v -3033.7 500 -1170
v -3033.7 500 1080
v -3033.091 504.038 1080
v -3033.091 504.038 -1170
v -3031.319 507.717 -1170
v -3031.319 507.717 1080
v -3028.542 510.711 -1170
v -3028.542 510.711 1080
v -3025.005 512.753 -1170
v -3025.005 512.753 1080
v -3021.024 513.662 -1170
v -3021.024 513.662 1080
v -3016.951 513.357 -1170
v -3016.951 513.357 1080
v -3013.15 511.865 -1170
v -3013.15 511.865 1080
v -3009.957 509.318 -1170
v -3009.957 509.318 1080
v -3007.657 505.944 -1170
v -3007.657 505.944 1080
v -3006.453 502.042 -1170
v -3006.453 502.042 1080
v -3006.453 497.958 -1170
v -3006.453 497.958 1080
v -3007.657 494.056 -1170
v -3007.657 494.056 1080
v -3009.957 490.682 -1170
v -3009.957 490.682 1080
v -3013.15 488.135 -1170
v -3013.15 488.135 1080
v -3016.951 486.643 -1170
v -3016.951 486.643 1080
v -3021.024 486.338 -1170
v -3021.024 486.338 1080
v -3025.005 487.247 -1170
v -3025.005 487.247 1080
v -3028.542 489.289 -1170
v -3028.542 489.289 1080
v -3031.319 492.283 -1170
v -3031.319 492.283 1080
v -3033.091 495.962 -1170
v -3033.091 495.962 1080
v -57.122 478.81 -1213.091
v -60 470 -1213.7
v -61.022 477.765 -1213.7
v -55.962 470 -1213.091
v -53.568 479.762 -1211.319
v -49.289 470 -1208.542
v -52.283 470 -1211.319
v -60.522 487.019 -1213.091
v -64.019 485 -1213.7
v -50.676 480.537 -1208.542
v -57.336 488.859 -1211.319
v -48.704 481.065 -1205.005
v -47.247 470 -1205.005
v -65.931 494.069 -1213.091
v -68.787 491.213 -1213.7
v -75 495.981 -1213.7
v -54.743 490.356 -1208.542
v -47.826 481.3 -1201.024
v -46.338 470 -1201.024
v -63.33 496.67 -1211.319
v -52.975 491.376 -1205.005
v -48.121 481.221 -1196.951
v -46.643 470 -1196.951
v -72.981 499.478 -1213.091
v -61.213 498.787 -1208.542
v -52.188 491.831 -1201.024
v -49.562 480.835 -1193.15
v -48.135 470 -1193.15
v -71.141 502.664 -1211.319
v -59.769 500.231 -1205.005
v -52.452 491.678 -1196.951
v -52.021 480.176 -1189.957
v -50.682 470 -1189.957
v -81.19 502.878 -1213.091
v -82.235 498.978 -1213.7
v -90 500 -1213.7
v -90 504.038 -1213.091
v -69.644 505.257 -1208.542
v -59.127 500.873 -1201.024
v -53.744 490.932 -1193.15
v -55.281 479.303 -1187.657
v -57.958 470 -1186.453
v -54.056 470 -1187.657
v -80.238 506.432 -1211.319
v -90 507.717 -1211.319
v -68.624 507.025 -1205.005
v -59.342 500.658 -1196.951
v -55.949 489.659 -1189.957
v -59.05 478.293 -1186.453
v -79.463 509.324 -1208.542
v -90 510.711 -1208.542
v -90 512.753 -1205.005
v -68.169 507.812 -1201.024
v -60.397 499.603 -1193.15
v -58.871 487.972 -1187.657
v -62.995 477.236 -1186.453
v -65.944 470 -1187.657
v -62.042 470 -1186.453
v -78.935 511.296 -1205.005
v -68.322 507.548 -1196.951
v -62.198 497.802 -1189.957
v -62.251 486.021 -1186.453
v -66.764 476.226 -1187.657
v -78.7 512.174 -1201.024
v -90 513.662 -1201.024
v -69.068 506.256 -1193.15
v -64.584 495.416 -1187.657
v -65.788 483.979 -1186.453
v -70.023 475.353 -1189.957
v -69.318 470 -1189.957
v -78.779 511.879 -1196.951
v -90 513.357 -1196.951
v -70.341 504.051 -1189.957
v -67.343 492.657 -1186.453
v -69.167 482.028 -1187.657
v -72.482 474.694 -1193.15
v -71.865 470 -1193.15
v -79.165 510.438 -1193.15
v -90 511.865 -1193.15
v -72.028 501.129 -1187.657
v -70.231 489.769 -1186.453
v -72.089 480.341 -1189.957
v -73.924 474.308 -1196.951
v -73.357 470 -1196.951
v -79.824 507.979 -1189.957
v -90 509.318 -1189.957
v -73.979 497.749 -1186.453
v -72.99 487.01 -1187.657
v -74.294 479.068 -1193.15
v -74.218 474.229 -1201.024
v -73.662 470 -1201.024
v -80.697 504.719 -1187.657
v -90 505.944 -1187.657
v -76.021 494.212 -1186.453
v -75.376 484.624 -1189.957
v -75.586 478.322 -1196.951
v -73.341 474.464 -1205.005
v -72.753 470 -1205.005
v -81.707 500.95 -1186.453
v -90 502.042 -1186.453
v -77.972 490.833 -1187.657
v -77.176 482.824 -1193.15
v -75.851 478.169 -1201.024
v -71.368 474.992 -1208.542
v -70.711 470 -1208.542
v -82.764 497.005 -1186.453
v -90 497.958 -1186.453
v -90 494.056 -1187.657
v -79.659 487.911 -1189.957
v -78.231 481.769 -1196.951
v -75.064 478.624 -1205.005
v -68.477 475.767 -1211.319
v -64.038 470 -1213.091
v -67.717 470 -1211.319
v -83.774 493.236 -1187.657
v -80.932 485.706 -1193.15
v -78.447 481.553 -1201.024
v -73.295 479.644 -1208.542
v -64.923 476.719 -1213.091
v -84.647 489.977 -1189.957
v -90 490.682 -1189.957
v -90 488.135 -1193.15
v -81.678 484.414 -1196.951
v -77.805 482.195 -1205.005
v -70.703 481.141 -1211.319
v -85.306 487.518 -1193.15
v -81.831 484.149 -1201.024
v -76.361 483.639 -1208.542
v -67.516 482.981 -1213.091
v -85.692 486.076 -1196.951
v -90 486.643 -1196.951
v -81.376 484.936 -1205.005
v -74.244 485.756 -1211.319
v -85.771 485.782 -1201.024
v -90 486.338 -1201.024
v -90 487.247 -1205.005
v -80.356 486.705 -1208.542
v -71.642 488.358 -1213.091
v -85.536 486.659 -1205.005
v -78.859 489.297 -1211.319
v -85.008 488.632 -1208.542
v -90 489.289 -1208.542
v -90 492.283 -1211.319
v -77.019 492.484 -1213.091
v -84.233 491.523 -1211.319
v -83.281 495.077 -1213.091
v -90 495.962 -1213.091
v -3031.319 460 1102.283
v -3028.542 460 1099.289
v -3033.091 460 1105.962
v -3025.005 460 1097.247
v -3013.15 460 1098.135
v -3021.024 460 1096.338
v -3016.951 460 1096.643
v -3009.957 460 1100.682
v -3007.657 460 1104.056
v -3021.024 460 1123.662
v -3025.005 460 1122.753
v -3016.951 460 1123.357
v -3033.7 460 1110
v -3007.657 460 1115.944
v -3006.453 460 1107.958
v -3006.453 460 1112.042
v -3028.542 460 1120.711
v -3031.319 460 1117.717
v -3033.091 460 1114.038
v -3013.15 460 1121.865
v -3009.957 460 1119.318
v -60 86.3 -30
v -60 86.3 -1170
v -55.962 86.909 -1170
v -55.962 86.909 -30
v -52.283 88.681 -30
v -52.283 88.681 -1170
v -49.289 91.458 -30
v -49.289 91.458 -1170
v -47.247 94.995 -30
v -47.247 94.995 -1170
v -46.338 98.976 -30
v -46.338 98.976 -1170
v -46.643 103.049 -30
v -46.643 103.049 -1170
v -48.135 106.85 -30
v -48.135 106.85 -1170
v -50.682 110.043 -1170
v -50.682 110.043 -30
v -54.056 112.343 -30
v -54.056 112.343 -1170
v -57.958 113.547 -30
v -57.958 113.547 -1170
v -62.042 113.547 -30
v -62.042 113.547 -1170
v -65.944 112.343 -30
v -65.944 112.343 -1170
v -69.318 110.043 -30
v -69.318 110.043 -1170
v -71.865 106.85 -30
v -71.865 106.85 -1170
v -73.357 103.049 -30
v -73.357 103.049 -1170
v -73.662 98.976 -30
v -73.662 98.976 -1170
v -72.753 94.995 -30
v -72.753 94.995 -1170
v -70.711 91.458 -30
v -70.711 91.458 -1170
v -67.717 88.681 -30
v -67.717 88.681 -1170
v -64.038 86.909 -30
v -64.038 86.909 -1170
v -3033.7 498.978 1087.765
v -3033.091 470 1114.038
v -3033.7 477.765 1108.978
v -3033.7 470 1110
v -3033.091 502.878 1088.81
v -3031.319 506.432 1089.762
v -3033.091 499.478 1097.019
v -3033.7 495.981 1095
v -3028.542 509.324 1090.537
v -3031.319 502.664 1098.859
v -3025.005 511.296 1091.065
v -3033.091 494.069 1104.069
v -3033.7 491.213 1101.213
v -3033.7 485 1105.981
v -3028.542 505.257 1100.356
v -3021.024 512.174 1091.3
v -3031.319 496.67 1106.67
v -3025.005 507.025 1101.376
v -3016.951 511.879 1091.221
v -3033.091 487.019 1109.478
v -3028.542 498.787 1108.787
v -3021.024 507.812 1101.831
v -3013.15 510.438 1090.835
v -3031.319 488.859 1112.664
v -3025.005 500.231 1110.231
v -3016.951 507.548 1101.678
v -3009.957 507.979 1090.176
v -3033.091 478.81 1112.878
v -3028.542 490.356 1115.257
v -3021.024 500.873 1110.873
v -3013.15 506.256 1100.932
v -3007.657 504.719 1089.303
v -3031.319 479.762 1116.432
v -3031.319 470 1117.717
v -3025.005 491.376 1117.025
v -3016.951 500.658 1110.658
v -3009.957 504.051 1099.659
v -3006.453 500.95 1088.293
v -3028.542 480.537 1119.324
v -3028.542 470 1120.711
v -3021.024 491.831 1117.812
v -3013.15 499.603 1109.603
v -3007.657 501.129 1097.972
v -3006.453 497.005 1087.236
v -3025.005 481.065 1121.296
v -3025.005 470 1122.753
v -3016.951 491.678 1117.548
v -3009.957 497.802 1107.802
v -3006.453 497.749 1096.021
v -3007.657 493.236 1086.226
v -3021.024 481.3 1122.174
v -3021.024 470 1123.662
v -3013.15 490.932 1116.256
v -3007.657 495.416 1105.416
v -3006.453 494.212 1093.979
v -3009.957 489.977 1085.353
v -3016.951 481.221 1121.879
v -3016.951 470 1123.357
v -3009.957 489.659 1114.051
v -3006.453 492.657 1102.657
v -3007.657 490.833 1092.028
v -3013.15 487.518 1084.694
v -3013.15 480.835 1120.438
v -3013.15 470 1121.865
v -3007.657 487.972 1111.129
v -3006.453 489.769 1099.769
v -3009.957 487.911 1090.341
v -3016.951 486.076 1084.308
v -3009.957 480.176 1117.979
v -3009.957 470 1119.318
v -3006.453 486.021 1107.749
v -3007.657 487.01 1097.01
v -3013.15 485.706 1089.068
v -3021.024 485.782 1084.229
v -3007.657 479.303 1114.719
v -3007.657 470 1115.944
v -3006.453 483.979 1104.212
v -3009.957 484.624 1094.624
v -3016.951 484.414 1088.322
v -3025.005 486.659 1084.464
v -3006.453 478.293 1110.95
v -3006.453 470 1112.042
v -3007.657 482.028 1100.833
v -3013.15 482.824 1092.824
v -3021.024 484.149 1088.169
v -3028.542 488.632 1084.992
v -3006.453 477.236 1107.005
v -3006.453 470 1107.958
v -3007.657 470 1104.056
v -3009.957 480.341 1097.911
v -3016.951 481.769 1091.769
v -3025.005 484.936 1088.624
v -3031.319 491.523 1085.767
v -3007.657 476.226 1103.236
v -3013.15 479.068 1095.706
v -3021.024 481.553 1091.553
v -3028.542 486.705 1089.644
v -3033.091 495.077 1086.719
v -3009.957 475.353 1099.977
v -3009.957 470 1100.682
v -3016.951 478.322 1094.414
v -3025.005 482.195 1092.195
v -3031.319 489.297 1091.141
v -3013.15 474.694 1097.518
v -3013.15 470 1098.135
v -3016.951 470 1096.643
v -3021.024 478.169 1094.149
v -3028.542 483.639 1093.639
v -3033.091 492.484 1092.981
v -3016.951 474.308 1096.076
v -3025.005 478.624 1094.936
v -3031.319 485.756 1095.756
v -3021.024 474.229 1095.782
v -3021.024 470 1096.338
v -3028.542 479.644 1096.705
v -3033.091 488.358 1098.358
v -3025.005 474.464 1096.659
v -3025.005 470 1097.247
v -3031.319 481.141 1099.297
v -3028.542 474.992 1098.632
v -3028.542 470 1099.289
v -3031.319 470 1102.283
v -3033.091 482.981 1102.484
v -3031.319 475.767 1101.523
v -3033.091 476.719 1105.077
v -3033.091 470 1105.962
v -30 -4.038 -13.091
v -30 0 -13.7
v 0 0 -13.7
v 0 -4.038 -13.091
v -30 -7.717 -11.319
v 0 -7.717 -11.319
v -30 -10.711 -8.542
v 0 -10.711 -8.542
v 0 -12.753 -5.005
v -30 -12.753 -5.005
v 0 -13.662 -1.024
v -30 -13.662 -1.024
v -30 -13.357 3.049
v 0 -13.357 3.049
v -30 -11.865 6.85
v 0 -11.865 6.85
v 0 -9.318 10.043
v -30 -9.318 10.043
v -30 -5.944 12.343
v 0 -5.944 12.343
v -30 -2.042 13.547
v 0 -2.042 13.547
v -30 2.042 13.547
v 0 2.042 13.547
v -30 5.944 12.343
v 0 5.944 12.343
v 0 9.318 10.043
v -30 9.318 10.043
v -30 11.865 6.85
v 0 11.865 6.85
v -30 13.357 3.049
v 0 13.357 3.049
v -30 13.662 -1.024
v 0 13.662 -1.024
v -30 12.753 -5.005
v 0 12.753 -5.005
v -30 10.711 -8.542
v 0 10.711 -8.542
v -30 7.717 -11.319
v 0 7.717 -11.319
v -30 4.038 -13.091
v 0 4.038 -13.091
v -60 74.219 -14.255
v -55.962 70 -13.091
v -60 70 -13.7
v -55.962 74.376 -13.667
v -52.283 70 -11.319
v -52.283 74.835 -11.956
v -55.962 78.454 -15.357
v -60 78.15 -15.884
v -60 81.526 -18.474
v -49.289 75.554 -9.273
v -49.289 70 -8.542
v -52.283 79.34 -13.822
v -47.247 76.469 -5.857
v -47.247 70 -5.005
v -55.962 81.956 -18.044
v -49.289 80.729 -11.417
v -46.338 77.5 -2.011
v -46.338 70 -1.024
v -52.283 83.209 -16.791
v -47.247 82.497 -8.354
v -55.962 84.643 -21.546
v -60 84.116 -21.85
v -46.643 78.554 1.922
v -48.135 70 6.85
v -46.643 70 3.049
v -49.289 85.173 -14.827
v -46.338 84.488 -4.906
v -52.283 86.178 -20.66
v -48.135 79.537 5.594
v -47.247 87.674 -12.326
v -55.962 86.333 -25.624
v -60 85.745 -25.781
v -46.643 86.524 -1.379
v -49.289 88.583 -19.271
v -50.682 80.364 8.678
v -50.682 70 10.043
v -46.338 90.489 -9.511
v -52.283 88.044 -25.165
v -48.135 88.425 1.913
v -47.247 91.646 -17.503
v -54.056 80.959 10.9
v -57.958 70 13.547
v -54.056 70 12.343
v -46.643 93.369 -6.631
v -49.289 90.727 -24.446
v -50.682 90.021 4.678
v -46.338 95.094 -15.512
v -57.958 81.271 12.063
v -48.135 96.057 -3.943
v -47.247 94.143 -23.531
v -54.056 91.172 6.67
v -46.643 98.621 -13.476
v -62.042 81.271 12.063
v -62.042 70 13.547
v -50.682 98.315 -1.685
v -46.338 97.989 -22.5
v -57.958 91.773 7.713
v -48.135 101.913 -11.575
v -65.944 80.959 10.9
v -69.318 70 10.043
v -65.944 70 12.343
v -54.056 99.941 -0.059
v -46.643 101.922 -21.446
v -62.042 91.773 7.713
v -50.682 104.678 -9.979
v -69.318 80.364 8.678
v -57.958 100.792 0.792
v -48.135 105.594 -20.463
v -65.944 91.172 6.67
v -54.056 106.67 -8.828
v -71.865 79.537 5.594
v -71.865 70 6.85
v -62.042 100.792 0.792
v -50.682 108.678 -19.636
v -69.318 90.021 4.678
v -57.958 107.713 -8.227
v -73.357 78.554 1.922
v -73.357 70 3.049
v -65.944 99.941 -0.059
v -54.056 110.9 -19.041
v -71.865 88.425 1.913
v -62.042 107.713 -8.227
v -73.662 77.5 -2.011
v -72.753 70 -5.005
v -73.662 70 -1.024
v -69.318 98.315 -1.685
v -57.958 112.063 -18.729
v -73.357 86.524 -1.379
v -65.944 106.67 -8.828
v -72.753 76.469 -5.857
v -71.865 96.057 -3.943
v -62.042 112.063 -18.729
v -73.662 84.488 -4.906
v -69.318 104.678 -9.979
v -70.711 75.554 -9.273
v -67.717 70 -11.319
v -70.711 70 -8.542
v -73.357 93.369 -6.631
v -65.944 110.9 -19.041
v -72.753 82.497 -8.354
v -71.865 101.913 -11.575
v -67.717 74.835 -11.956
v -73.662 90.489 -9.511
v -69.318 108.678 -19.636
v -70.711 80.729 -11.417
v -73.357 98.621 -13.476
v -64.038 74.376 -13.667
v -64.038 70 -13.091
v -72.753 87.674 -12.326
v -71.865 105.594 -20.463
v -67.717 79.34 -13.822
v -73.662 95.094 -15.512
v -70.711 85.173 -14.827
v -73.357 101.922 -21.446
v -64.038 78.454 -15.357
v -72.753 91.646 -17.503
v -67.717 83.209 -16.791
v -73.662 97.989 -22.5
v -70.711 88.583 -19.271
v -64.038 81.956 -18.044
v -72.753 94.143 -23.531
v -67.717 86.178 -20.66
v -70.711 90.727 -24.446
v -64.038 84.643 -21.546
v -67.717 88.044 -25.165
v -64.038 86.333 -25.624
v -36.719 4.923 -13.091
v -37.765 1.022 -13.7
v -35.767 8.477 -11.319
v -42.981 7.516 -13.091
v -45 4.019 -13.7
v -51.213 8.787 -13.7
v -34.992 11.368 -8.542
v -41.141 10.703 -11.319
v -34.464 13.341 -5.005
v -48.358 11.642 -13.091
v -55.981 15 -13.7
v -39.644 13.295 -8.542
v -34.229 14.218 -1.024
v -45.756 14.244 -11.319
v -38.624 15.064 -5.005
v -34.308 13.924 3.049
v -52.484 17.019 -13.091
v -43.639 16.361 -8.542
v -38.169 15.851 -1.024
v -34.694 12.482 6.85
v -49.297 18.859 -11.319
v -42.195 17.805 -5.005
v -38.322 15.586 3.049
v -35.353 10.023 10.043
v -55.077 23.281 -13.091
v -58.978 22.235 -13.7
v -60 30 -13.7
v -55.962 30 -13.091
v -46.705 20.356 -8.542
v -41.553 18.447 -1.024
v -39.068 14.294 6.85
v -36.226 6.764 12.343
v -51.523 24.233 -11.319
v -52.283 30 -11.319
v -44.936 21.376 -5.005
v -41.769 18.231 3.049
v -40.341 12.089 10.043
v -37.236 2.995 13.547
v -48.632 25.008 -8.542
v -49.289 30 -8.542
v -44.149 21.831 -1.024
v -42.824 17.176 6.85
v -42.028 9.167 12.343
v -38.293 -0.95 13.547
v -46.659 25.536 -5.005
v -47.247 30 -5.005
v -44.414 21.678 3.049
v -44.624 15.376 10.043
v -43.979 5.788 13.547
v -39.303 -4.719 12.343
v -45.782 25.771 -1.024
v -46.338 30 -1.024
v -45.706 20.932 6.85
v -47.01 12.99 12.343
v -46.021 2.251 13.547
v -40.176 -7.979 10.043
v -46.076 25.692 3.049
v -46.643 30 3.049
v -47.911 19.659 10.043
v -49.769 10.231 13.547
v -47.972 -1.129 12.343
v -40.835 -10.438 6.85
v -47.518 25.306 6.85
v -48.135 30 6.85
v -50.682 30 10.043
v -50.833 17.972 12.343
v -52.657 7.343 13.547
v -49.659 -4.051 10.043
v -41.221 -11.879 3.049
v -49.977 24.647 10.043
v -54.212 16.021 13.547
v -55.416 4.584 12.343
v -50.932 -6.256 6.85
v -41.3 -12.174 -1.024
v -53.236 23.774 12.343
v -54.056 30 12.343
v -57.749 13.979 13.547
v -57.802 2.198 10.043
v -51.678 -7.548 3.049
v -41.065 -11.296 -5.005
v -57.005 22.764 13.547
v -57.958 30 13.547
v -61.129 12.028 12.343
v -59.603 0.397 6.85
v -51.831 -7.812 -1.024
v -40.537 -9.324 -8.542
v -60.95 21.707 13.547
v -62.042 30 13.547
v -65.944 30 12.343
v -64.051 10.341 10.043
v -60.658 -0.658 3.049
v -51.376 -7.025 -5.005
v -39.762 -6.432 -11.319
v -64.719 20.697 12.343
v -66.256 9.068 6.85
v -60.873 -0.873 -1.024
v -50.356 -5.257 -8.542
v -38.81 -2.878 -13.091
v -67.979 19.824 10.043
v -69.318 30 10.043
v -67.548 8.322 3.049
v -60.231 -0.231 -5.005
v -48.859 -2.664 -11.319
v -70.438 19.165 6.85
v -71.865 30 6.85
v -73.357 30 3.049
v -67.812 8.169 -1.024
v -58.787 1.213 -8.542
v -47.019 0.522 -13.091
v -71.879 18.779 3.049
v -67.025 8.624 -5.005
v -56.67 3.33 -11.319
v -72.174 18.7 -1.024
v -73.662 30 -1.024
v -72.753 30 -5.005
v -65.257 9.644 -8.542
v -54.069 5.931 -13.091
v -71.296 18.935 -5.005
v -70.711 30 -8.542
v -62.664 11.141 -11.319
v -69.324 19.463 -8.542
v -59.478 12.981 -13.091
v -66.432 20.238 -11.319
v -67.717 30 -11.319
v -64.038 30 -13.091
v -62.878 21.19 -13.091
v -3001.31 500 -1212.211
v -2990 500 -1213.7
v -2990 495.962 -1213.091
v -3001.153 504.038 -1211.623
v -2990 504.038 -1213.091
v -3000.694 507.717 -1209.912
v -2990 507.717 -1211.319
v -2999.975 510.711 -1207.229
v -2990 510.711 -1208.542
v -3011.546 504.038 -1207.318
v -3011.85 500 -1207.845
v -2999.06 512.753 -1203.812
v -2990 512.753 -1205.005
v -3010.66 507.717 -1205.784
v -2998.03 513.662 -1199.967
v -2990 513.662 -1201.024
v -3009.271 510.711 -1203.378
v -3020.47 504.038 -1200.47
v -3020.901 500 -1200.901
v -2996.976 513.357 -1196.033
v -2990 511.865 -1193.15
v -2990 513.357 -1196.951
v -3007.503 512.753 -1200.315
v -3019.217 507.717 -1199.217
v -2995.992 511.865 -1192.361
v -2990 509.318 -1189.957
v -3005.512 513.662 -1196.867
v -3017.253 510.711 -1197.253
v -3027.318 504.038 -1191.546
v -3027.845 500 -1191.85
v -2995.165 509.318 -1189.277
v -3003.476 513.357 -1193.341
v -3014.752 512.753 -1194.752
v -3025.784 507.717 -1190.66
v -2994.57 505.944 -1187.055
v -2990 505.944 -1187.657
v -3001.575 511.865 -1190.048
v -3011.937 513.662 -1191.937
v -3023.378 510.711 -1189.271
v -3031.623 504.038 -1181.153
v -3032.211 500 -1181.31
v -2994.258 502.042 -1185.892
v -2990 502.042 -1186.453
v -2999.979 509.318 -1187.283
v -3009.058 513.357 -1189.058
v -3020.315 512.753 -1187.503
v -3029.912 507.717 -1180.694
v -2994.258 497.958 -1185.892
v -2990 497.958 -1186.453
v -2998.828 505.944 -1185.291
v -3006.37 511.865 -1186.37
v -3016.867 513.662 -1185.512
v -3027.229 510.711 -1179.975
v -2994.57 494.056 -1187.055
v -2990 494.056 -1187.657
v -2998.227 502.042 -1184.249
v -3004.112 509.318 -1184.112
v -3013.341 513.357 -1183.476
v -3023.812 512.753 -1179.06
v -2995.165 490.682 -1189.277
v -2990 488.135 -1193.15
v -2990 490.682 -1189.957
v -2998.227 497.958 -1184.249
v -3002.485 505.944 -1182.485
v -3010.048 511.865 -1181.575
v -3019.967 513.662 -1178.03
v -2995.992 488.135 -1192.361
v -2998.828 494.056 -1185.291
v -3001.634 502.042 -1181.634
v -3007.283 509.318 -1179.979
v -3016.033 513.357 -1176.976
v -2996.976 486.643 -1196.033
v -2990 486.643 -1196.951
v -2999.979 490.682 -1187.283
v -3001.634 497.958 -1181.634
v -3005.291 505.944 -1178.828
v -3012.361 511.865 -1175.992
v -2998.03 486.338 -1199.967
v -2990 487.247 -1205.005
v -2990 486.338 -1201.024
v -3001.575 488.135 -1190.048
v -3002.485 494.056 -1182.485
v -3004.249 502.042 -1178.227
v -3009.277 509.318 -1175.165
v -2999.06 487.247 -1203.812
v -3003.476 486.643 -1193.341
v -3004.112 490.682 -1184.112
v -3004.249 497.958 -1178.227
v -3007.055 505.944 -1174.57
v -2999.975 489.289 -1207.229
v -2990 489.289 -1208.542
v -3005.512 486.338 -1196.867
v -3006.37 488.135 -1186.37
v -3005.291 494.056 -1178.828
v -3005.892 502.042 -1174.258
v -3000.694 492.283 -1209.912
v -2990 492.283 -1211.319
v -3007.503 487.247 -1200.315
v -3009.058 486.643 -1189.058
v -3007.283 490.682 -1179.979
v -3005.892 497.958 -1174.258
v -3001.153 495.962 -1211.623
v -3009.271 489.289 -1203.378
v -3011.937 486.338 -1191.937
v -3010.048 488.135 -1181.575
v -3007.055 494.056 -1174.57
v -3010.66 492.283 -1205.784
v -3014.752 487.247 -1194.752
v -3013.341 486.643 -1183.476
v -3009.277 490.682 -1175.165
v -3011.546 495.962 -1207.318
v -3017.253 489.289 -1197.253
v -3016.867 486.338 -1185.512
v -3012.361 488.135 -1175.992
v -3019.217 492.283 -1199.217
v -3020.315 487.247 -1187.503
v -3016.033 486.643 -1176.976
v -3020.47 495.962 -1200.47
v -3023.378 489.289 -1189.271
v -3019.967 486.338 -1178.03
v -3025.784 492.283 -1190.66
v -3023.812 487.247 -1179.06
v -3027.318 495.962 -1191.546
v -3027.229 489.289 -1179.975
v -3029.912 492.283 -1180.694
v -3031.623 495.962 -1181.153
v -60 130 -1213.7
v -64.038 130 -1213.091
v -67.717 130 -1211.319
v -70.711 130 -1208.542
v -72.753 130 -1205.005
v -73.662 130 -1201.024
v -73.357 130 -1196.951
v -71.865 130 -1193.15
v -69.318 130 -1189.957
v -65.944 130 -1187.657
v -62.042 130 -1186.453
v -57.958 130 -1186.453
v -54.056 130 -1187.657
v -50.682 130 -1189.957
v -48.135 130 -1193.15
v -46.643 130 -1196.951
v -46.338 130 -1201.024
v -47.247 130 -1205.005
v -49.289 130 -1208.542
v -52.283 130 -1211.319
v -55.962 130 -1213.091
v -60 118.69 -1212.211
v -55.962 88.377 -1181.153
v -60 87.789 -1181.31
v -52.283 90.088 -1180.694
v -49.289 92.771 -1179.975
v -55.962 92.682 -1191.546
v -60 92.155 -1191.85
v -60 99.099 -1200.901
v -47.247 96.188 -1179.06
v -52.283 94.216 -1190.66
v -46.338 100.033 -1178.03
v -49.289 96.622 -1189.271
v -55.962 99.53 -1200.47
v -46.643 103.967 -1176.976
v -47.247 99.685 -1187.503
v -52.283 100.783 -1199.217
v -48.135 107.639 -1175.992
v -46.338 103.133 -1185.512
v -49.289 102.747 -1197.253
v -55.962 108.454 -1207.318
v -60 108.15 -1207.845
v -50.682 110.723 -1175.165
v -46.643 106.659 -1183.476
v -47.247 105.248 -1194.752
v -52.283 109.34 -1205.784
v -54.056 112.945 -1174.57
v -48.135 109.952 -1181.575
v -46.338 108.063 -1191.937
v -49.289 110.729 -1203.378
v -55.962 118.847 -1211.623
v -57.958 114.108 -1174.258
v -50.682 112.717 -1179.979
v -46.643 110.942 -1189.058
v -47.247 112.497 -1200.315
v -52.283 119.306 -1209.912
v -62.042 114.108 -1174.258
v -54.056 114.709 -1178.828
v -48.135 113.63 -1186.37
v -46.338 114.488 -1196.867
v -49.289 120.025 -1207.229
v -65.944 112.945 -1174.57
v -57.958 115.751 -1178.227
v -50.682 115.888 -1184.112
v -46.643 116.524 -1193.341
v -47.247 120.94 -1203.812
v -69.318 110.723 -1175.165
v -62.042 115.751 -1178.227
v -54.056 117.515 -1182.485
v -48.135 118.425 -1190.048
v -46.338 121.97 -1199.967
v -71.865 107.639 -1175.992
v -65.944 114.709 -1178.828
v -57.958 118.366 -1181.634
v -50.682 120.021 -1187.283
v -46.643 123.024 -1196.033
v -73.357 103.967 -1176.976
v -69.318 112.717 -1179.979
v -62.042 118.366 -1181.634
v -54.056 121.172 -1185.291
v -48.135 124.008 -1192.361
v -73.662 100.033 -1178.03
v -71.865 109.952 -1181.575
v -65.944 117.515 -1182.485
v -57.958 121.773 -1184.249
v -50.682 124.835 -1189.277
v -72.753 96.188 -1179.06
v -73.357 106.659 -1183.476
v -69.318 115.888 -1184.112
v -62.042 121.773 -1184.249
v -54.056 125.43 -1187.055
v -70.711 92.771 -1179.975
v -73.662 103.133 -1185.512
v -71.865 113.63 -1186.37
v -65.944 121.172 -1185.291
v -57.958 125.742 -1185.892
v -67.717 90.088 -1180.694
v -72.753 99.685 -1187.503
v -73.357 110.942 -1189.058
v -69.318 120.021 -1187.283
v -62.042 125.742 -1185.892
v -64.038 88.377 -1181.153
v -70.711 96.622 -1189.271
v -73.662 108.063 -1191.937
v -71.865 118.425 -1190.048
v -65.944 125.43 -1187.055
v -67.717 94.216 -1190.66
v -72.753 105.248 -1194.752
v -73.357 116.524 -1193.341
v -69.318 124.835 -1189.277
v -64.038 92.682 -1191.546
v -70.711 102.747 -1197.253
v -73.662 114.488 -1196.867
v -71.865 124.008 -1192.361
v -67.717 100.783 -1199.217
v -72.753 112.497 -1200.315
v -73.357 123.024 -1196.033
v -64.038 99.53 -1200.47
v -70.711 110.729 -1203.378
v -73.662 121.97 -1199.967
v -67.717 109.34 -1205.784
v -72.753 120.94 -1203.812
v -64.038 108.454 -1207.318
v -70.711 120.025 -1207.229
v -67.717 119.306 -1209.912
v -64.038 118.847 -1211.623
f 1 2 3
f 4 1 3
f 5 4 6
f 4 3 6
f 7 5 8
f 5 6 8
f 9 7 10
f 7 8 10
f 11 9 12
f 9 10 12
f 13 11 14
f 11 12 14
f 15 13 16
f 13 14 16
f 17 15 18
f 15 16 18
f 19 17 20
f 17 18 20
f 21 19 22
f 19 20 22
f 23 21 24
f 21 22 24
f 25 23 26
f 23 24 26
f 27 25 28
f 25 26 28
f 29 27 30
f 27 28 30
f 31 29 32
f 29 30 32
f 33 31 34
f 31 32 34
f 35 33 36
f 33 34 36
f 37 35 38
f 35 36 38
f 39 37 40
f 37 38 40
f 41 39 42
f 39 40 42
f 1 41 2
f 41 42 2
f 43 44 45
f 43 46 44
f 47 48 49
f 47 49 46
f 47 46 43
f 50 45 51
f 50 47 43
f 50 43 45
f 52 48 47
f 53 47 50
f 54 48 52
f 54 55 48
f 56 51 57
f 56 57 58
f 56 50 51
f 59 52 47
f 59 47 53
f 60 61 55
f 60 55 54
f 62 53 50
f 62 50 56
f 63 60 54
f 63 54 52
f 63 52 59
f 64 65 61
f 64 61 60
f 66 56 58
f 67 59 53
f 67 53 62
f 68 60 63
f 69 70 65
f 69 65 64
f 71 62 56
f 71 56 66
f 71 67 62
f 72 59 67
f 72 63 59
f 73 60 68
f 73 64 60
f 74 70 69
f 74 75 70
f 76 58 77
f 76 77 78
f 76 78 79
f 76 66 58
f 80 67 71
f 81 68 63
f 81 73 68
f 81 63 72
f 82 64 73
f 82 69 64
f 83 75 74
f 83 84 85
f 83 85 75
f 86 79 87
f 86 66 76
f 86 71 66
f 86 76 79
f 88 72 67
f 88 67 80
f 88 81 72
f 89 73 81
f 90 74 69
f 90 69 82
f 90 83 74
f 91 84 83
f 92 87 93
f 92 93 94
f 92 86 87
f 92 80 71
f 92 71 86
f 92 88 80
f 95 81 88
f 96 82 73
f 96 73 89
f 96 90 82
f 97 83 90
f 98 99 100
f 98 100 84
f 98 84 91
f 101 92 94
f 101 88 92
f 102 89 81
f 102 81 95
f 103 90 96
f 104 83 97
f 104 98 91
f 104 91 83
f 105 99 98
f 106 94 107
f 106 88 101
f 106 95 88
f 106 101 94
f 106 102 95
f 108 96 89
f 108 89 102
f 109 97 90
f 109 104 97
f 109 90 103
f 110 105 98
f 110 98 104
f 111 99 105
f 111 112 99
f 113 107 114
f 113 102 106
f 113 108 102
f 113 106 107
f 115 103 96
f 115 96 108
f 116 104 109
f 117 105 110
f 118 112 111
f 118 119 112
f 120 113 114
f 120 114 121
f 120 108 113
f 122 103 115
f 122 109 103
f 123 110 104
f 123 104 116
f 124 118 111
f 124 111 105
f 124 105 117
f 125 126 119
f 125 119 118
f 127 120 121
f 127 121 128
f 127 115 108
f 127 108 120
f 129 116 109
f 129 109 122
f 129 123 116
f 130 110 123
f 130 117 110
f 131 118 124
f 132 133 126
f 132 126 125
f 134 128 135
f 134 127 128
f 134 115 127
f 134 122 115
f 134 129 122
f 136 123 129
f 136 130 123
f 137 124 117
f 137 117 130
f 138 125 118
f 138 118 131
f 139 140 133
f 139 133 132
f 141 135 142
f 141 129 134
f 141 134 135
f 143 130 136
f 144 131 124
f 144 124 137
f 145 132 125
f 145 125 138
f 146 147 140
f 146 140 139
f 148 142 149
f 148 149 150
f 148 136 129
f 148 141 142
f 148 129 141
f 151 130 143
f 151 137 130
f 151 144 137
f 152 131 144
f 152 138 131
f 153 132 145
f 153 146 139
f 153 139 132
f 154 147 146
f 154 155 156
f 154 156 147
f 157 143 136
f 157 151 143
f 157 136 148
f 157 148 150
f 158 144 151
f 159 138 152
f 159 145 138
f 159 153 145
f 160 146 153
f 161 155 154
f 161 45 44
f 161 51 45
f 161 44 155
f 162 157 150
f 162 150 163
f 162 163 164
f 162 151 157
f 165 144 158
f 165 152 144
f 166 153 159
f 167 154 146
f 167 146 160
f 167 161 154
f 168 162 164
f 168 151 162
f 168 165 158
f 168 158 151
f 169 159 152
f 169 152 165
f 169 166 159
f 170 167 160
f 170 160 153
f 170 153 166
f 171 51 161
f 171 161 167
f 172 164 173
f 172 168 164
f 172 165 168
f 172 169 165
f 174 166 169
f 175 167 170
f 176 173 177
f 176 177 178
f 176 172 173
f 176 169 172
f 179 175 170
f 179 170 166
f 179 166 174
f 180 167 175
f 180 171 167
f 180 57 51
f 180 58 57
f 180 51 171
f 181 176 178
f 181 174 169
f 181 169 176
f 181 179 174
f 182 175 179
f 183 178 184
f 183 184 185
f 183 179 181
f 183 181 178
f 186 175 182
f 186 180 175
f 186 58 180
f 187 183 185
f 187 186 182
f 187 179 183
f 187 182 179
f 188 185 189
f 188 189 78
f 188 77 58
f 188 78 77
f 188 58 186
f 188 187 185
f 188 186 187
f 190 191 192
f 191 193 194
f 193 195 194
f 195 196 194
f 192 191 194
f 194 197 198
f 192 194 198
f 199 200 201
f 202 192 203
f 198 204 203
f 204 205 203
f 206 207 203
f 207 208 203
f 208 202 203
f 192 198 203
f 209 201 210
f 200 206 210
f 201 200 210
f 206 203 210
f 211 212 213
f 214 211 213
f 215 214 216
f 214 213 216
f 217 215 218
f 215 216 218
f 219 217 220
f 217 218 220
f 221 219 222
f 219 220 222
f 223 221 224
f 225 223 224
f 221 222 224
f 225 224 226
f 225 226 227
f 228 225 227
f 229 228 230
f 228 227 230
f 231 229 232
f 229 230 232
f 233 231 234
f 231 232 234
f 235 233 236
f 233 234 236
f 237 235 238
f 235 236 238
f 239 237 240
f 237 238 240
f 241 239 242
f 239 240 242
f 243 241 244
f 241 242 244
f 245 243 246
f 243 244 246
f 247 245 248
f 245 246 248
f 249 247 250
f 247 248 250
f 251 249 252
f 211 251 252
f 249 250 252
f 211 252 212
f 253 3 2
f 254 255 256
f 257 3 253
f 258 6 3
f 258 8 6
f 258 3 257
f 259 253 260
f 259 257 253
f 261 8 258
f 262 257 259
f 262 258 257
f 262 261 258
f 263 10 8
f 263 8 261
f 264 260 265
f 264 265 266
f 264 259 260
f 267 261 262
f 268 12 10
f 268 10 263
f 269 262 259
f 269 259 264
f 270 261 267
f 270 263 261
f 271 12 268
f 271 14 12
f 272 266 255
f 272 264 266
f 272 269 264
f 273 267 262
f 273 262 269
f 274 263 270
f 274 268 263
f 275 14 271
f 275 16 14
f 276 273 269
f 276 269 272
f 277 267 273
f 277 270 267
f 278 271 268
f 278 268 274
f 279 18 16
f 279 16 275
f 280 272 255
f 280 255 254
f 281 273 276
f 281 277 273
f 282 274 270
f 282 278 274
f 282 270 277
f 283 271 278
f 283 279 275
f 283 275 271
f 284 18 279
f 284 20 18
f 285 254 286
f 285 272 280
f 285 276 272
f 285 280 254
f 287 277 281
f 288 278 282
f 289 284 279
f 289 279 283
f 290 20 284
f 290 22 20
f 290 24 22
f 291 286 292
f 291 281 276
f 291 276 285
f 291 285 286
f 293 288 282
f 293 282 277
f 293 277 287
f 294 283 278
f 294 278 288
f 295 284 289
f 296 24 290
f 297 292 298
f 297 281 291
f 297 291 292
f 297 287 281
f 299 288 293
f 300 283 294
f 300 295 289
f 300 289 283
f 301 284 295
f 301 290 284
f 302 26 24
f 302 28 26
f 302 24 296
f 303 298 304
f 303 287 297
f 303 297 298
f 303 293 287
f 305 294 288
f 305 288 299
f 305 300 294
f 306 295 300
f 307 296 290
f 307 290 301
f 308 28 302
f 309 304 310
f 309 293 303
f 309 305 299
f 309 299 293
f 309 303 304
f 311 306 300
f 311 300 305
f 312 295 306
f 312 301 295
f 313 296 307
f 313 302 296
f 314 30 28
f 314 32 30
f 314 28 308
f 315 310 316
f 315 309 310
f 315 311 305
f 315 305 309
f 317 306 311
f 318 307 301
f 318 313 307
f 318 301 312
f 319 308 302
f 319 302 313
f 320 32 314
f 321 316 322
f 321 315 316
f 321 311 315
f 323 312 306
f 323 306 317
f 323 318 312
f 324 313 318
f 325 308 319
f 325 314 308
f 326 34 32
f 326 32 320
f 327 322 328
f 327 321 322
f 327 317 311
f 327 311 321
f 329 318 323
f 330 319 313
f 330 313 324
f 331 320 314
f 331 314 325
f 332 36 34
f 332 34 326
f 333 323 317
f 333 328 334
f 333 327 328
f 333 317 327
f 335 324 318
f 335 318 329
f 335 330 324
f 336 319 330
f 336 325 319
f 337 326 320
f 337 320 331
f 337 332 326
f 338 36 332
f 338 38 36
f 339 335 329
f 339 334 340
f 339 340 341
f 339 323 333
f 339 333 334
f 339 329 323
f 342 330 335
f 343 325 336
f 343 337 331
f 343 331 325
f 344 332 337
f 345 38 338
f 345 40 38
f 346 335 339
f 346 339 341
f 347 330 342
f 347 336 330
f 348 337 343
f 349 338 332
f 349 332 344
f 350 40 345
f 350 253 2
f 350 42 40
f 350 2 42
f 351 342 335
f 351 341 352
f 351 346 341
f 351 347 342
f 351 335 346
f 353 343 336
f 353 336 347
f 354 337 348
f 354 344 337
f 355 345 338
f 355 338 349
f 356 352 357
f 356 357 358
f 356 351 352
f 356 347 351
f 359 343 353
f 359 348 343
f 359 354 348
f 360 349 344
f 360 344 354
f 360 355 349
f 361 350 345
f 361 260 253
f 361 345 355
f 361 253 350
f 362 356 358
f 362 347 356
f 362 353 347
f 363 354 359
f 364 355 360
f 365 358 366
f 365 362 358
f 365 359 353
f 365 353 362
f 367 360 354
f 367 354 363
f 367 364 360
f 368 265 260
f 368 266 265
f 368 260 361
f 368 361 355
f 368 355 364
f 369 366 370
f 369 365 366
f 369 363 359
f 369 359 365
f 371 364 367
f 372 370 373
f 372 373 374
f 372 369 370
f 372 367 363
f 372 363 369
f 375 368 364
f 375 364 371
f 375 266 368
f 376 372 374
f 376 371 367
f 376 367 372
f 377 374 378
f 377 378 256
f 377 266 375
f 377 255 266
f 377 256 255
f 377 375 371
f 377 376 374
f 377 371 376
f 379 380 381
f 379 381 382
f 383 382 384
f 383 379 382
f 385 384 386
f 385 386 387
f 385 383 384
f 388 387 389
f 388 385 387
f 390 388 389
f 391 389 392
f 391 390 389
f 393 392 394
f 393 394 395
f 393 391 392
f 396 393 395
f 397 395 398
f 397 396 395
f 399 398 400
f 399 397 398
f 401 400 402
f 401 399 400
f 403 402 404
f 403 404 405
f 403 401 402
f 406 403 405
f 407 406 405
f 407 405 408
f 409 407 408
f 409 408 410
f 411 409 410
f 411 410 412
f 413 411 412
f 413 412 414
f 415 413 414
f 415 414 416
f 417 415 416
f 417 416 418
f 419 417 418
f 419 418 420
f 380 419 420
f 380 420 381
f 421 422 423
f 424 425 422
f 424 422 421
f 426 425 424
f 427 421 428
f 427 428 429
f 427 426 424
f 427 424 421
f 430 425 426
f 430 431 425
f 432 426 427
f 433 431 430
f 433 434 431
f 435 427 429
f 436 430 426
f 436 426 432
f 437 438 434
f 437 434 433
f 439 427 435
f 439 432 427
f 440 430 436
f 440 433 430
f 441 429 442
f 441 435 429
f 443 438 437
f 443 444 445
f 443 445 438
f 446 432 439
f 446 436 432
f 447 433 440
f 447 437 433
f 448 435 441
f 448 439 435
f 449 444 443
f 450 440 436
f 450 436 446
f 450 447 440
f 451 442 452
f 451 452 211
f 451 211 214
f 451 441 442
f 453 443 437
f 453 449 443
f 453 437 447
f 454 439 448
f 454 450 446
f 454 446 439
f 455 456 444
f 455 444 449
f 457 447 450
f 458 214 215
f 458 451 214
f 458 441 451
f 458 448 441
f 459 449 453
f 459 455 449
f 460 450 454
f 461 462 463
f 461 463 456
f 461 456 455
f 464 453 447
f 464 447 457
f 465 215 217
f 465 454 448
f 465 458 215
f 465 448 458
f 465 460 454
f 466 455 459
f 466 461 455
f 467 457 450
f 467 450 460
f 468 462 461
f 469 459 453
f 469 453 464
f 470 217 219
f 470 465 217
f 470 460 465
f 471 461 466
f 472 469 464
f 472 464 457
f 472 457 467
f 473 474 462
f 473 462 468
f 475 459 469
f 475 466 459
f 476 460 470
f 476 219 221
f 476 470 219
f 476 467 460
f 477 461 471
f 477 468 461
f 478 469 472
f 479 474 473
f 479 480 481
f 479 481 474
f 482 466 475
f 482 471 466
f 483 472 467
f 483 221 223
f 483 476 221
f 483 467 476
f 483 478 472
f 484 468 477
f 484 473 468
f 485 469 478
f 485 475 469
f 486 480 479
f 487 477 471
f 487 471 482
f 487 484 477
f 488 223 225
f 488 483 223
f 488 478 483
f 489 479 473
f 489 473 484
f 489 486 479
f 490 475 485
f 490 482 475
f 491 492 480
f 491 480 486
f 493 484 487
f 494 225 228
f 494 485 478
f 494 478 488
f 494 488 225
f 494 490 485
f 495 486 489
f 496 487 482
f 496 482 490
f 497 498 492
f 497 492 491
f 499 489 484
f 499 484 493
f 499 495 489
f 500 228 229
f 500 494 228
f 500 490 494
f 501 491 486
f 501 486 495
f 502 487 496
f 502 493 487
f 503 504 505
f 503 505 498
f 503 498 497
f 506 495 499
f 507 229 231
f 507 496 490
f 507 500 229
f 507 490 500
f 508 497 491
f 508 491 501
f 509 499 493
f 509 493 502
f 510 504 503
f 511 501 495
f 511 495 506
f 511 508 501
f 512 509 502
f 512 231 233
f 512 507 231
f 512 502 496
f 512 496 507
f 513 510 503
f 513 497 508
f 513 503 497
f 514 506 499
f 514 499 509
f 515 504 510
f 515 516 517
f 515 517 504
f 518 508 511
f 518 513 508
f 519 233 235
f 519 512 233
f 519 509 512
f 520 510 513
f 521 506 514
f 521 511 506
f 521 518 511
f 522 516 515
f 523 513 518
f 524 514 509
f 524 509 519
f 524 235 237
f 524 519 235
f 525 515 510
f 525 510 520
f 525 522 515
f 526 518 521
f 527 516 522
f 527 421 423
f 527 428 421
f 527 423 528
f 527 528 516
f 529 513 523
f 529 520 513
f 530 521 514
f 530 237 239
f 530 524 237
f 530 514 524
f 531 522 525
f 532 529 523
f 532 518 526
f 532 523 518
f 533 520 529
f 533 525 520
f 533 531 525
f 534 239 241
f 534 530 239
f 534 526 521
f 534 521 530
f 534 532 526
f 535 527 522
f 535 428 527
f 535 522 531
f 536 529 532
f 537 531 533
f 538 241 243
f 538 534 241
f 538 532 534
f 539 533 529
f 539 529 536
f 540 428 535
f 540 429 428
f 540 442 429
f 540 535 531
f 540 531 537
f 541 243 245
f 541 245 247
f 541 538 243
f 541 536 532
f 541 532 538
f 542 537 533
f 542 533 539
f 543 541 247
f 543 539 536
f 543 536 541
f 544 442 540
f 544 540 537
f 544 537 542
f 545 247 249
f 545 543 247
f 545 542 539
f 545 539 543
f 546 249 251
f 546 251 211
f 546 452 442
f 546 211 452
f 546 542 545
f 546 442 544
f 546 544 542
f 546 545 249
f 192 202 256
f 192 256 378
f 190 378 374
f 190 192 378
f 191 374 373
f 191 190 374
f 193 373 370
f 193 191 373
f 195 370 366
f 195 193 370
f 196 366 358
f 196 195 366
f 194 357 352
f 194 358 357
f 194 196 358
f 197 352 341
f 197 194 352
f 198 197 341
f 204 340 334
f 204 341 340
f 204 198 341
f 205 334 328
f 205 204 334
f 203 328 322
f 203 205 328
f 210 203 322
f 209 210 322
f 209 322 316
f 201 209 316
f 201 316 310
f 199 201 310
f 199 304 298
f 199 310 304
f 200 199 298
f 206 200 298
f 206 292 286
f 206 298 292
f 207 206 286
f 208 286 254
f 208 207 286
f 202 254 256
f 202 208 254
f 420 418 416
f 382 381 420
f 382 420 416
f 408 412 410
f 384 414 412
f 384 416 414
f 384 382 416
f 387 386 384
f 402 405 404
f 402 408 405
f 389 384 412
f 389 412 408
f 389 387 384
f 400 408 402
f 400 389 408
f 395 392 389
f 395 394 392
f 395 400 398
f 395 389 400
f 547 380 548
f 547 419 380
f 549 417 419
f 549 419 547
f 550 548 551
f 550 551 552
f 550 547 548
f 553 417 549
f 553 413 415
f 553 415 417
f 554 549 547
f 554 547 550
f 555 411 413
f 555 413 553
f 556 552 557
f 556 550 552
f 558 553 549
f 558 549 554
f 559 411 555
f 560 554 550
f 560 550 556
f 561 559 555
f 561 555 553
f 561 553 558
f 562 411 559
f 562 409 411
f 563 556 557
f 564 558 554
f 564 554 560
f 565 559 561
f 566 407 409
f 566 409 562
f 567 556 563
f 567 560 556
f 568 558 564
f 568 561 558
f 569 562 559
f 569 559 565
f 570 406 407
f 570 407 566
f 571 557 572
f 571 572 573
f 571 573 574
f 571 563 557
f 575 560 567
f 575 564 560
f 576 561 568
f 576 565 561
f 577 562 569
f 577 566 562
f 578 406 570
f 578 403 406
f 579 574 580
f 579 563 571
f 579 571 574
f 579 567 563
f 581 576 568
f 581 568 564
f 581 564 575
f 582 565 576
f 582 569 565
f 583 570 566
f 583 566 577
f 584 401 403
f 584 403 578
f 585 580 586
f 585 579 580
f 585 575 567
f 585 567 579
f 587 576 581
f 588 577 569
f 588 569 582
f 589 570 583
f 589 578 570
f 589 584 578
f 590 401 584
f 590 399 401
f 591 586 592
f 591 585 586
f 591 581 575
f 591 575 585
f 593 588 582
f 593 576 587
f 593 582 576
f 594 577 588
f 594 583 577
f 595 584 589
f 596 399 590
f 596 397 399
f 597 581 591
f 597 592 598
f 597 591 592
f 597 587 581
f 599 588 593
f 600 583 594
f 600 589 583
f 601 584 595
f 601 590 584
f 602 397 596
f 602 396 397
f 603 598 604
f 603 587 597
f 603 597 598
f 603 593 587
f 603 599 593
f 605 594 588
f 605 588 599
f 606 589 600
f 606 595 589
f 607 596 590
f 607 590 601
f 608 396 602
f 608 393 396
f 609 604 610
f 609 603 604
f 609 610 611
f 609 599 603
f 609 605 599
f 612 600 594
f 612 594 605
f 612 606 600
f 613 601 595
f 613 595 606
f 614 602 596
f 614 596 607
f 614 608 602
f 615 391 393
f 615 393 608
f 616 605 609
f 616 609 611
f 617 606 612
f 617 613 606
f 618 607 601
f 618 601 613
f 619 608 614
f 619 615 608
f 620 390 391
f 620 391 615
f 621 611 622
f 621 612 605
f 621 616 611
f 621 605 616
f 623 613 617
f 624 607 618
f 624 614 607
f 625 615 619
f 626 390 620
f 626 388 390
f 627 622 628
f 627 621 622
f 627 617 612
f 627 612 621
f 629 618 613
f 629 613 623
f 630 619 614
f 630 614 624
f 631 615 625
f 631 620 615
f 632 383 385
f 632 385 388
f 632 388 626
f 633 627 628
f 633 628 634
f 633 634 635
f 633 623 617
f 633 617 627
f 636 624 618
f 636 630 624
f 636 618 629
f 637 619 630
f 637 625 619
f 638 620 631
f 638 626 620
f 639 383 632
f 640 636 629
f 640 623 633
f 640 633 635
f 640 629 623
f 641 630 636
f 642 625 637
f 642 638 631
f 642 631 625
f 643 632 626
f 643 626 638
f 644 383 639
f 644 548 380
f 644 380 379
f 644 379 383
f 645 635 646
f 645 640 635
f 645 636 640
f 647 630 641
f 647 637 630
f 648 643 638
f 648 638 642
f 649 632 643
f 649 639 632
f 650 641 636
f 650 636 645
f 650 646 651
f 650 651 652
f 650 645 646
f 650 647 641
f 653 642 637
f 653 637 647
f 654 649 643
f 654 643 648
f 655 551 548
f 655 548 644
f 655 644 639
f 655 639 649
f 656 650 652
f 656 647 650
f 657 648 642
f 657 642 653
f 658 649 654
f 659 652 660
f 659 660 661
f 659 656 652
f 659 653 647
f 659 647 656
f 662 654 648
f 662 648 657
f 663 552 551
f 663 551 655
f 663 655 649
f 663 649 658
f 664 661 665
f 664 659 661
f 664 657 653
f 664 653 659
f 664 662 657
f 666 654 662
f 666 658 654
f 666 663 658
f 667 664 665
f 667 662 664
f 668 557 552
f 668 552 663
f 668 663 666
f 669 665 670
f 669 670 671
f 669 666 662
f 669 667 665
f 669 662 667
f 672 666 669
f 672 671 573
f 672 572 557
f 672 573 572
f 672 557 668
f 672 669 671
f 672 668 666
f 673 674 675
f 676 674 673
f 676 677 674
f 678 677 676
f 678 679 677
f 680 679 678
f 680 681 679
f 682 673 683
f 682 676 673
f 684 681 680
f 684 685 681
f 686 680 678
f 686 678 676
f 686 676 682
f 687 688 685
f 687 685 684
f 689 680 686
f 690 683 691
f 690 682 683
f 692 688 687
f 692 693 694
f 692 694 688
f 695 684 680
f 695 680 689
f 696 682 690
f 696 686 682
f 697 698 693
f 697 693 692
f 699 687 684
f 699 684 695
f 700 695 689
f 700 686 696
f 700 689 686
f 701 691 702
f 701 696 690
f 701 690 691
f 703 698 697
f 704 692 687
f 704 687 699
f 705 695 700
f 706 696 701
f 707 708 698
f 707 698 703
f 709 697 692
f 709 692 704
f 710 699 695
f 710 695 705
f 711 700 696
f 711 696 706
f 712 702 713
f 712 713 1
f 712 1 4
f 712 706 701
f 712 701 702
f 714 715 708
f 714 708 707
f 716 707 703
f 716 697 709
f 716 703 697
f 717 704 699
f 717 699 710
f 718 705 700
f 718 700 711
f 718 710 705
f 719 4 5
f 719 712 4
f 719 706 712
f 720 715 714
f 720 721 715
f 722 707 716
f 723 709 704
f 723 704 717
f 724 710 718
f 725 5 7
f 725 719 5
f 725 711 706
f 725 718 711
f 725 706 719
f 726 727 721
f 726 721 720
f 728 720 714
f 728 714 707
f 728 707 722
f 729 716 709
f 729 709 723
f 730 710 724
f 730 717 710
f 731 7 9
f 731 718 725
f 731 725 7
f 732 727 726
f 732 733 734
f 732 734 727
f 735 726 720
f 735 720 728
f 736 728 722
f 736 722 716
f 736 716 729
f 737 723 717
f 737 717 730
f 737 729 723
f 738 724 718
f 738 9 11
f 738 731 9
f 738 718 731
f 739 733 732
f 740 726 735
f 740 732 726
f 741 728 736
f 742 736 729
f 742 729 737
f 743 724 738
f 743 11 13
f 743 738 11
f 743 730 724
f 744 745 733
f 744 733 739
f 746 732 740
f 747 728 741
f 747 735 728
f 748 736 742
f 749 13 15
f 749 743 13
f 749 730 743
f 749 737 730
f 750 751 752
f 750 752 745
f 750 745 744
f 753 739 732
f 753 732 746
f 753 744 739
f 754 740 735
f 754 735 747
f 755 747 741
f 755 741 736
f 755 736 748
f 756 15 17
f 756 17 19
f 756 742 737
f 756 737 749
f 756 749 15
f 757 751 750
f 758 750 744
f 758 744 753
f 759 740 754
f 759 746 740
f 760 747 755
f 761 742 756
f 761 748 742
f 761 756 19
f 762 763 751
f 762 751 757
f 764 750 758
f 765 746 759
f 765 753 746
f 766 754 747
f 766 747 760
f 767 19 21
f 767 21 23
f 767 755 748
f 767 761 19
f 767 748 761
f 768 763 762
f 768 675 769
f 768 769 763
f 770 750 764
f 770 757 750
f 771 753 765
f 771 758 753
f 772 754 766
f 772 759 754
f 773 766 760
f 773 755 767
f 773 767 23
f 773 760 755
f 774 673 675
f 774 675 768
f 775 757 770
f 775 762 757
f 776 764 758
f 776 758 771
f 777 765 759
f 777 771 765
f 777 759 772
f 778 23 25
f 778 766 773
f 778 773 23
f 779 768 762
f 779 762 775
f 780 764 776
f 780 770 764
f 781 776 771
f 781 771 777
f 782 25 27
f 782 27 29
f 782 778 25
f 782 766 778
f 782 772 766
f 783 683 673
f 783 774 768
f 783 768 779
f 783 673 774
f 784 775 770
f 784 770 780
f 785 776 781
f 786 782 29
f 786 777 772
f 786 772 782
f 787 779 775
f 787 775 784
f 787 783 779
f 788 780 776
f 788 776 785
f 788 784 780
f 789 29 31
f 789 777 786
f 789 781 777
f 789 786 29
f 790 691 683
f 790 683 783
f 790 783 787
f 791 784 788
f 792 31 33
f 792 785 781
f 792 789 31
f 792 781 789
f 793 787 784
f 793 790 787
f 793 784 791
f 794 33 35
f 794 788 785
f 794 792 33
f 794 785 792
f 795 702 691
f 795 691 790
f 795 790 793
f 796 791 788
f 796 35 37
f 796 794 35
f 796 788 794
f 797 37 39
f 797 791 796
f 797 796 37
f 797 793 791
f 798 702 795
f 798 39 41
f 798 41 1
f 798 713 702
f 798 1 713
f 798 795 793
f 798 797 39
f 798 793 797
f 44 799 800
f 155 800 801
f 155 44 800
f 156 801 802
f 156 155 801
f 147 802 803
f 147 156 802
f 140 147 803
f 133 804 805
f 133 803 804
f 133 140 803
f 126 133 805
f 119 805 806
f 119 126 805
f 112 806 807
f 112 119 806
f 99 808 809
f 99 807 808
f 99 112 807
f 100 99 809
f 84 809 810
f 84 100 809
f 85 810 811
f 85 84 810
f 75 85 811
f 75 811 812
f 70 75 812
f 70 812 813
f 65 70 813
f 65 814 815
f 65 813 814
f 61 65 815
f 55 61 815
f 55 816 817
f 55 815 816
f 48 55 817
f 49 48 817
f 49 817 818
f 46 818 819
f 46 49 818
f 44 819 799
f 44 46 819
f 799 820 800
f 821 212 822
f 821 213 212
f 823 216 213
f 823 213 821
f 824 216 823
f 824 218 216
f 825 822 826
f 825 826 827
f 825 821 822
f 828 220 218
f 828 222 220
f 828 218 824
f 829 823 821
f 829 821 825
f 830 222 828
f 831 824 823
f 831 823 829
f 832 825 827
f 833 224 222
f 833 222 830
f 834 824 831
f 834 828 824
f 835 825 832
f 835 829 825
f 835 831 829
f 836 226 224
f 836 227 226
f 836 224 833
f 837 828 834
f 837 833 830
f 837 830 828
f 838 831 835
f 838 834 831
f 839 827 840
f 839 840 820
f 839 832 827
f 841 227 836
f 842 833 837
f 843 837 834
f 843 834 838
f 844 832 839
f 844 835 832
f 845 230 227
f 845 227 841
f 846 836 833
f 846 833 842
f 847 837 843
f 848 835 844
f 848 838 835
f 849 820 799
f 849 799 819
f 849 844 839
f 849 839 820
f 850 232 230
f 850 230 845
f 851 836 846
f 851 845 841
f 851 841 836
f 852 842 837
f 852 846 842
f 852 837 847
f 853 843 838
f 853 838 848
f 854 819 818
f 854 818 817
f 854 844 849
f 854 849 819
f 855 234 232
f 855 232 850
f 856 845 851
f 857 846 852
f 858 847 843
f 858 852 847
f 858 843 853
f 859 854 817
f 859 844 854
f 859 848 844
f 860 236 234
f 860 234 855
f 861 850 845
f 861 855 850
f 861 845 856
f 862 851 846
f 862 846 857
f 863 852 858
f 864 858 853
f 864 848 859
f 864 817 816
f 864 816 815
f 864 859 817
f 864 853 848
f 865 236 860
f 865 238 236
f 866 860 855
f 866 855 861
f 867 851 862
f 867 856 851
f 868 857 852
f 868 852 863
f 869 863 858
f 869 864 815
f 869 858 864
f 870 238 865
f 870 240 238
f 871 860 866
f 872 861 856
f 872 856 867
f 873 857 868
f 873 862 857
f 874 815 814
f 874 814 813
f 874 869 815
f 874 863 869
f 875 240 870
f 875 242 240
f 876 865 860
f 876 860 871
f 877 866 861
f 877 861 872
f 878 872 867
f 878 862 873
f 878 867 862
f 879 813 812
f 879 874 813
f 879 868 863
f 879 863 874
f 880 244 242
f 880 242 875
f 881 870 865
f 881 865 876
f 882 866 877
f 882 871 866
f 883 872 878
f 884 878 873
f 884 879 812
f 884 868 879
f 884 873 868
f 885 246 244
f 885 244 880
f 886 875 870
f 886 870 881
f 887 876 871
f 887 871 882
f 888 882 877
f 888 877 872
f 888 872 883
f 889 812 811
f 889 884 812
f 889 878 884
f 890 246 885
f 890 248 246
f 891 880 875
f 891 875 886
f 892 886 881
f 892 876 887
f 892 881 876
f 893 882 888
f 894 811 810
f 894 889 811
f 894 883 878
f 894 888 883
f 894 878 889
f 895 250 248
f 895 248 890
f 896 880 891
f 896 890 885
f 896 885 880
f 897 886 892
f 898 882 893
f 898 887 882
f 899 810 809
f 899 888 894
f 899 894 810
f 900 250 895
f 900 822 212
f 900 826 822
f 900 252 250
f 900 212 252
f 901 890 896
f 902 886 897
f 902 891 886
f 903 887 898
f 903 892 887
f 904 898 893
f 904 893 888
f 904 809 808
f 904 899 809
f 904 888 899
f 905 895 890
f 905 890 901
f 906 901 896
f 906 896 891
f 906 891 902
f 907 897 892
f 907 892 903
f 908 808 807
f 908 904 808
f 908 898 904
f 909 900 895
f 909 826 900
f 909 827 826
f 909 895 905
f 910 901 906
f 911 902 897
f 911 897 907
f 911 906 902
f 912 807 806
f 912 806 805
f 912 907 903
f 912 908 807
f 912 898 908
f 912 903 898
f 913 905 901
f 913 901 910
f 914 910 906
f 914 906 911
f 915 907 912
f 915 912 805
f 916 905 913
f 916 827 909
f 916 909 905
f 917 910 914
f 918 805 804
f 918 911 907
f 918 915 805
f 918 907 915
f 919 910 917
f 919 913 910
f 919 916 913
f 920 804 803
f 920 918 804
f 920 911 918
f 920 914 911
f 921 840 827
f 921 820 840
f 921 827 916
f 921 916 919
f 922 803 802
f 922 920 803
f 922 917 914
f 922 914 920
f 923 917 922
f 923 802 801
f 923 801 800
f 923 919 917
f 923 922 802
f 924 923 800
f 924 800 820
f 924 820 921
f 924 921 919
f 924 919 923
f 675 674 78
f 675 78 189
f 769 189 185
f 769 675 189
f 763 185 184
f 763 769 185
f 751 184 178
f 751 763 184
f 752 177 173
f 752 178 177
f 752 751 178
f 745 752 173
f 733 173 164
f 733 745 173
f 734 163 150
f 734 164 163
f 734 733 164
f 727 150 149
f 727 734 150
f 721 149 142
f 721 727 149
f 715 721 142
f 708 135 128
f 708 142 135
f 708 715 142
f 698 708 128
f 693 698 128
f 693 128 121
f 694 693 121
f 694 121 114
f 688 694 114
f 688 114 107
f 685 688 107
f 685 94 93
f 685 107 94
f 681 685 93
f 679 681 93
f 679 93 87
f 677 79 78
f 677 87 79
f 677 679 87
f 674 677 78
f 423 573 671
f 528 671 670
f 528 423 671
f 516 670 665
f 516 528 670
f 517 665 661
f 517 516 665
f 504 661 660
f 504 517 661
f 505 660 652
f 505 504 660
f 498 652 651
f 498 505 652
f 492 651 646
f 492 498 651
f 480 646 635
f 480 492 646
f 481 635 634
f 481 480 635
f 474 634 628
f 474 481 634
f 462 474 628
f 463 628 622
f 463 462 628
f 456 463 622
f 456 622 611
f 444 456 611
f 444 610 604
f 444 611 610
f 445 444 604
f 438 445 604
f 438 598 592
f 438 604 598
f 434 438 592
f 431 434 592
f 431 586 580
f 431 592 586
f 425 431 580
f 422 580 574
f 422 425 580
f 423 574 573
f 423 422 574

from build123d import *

# Parameters (mm, degrees)
CROQUIS1_R = 13.7


with BuildPart() as part:
    # Barrer1: sweep along a curve in space
    with BuildLine() as barrer1_path:
        Line((0, 0, 0), (-30, 0, 0))
        ThreePointArc((-30, 0, 0), (-51.213203436, 8.786796564, 0), (-60, 30, 0))
        Line((-60, 30, 0), (-60, 70, 0))
        ThreePointArc((-60, 70, 0), (-60, 91.213203436, -8.786796564), (-60, 100, -30))
        Line((-60, 100, -30), (-60, 100, -1170))
        ThreePointArc((-60, 130, -1200), (-60, 108.786796564, -1191.213203436), (-60, 100, -1170))
        Line((-60, 130, -1200), (-60, 470, -1200))
        ThreePointArc((-60, 470, -1200), (-68.786796564, 491.213203436, -1200), (-90, 500, -1200))
        Line((-90, 500, -1200), (-2990, 500, -1200))
        ThreePointArc((-2990, 500, -1200), (-3011.213203436, 500, -1191.213203436), (-3020, 500, -1170))
        Line((-3020, 500, -1170), (-3020, 500, 1080))
        ThreePointArc((-3020, 500, 1080), (-3020, 491.213203436, 1101.213203436), (-3020, 470, 1110))
        Line((-3020, 470, 1110), (-3020, 460, 1110))
    # Croquis1 → Barrer1 (sweep)
    with BuildSketch(Plane(origin=(0, 0, 0), x_dir=(0, 0, -1), z_dir=(1, 0, 0))):
        Circle(CROQUIS1_R)
    sweep(path=barrer1_path.line)


solid = part.part
